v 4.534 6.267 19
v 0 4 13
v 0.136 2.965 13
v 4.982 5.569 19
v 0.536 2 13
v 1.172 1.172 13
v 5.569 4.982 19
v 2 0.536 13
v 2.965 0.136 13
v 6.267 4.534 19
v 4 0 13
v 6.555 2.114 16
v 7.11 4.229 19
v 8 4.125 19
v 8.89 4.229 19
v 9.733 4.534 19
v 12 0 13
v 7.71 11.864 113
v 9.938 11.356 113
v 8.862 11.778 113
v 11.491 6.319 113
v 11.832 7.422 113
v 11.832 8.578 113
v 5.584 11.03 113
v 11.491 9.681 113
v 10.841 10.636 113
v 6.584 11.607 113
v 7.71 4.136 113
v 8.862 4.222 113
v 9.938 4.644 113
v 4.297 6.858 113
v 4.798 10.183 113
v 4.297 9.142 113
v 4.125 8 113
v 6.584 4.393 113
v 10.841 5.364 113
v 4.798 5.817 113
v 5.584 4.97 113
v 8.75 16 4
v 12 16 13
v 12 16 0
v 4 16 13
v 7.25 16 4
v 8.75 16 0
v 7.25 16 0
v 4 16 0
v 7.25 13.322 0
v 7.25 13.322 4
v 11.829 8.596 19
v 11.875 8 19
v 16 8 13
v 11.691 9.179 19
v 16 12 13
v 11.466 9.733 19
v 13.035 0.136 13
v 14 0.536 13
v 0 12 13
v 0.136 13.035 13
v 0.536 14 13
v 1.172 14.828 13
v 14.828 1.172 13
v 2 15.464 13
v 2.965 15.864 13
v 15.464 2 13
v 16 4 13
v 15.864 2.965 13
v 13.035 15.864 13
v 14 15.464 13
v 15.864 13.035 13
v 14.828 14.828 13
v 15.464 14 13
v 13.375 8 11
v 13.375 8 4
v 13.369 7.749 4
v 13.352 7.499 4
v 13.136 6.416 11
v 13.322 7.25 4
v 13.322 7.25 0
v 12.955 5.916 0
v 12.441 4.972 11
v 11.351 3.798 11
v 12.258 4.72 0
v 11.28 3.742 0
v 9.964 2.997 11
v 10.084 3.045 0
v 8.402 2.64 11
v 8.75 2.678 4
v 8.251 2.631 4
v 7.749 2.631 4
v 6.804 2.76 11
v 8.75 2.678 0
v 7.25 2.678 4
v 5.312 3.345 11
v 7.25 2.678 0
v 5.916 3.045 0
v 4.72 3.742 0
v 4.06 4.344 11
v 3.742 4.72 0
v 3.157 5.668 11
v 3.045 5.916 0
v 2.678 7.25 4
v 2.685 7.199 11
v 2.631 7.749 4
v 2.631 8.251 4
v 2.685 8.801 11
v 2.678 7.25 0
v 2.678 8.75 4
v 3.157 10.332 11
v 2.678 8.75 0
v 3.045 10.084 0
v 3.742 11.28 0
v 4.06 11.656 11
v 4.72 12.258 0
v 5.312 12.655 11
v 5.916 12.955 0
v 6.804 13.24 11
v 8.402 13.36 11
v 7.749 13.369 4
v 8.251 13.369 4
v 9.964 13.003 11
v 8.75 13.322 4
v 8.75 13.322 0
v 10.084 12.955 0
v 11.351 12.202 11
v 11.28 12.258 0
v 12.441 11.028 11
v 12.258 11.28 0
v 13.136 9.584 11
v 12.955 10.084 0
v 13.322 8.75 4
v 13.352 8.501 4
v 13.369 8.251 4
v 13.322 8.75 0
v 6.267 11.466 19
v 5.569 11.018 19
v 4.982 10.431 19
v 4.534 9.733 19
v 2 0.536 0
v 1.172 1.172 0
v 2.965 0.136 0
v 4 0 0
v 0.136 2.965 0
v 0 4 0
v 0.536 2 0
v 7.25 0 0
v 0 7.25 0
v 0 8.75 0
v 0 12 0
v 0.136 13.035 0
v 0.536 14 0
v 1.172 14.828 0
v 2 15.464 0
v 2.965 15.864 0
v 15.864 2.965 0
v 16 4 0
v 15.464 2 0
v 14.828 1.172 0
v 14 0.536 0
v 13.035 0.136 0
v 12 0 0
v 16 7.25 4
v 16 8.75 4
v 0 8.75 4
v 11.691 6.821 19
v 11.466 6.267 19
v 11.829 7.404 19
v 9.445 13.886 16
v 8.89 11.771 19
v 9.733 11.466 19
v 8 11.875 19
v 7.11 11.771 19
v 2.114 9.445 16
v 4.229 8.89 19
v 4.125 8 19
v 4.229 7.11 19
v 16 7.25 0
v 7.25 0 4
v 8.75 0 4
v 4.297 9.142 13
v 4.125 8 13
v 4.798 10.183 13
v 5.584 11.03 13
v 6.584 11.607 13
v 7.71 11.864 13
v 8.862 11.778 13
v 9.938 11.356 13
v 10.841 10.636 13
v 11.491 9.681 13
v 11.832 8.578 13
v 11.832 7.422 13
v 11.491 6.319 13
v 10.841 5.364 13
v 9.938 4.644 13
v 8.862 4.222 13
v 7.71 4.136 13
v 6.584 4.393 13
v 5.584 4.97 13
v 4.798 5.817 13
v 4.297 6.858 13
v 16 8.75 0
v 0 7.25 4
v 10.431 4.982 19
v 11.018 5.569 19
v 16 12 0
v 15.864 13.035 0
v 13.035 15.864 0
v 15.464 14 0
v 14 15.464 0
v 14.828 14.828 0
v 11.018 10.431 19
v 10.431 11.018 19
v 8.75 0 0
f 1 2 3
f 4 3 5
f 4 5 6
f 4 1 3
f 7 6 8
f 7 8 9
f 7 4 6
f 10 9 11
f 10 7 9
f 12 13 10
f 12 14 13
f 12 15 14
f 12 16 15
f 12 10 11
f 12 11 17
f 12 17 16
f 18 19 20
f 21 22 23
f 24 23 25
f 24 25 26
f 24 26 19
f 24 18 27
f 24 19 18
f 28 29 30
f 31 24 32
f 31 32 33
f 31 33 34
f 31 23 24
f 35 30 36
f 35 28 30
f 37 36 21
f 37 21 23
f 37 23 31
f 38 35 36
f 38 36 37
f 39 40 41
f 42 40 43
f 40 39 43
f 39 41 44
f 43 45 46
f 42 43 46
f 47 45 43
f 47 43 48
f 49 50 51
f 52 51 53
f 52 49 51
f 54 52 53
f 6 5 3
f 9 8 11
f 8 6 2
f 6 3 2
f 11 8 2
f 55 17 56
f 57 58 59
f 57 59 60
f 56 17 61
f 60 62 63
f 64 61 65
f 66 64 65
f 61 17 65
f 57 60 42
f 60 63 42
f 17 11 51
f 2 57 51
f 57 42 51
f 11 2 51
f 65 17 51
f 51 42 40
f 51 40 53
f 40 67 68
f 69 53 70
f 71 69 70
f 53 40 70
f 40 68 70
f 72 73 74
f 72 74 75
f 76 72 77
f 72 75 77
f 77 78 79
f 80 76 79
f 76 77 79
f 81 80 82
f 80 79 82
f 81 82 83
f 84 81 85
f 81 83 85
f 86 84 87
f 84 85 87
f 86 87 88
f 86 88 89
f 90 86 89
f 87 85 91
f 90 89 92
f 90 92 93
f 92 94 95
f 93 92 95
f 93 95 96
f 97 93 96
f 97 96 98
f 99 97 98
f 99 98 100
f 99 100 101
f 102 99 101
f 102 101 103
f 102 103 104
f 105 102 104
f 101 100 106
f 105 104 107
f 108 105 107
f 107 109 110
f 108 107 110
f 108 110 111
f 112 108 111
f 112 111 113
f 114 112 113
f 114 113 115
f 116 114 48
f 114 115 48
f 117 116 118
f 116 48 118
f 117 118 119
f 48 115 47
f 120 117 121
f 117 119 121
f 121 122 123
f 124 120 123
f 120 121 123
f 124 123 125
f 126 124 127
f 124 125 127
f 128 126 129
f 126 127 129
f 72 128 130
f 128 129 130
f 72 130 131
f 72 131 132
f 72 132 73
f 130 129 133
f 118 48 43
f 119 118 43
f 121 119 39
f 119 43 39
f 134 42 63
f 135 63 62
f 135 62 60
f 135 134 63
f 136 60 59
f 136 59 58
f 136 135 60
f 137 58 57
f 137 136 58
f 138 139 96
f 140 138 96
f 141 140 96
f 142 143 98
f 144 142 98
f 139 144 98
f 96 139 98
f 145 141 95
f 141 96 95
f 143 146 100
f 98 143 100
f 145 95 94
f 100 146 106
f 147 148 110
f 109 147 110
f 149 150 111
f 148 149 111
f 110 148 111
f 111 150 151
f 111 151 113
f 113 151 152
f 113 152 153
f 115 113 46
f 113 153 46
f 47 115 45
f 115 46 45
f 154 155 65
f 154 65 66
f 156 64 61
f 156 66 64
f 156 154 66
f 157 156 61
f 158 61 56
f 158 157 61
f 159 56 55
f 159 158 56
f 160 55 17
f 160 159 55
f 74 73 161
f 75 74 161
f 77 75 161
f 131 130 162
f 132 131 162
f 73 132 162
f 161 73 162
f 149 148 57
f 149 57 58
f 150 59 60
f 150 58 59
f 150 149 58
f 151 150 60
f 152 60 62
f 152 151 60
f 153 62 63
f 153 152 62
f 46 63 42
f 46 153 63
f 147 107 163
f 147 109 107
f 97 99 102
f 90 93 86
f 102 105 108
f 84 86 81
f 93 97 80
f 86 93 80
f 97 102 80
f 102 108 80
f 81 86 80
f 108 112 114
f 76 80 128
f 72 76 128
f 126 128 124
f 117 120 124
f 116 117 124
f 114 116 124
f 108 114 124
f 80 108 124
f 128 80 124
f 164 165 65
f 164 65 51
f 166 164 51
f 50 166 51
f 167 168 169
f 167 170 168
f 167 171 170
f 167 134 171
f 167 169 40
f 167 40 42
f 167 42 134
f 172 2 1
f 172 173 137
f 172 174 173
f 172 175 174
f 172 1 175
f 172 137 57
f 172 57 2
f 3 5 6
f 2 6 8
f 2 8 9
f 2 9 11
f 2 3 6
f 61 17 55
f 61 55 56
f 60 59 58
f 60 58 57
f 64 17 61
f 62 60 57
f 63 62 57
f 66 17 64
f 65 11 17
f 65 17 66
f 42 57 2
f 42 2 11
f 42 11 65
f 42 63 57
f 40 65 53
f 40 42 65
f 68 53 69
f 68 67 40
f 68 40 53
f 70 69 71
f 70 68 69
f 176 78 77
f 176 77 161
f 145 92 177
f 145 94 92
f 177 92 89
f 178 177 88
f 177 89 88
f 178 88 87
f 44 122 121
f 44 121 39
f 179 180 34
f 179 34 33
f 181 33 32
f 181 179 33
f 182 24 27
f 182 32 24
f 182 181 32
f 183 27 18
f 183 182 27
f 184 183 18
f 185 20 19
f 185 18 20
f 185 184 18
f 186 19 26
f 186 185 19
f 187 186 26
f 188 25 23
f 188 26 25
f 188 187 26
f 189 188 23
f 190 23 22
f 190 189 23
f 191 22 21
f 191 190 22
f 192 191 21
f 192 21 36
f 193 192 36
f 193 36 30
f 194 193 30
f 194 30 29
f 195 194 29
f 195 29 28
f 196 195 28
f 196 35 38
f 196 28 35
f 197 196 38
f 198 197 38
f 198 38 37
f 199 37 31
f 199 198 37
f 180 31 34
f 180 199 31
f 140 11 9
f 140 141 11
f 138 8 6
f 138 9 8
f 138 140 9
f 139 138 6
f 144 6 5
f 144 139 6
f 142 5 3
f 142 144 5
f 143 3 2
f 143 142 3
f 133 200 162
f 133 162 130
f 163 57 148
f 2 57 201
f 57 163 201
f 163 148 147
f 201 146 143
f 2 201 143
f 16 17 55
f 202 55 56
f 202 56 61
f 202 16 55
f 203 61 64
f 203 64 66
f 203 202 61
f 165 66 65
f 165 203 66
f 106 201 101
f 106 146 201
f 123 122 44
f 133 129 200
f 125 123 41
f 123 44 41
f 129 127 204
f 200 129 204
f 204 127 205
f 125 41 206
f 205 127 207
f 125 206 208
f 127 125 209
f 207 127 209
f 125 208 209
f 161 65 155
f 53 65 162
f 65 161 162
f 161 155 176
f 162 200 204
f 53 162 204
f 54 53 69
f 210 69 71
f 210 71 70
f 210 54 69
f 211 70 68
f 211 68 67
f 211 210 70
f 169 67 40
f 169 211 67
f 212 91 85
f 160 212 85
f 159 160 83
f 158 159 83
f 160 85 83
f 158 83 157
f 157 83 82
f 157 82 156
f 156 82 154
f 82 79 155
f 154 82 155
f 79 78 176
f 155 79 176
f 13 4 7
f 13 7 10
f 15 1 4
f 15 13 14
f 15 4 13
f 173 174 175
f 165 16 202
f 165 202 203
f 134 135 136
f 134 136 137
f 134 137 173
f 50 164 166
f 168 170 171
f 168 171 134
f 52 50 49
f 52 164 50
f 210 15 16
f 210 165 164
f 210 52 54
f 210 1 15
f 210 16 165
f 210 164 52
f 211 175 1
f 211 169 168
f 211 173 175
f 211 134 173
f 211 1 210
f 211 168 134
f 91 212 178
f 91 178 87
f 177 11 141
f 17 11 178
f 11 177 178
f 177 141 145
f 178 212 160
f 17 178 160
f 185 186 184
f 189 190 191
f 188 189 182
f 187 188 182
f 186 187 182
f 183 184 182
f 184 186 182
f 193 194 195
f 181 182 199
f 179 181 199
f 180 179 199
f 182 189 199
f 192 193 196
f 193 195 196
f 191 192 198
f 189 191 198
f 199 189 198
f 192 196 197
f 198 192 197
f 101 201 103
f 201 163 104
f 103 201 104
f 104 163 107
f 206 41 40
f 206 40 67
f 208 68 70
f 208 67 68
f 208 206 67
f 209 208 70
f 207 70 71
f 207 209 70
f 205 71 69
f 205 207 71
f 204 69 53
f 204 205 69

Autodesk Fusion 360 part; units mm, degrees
sketch "Sketch1" plane through (0, 0, 0) normal (0, 0, 1) x (1, 0, 0) in component "Cube Connector"
  line L0 (4, 0) -> (12, 0)
  line L1 (16, 4) -> (16, 12)
  line L2 (12, 16) -> (4, 16)
  line L3 (0, 12) -> (0, 4)
  arc A0 (12, 0) -> (16, 4) centre (12, 4) ccw
  arc A1 (0, 4) -> (4, 0) centre (4, 4) ccw
  arc A2 (4, 16) -> (0, 12) centre (4, 12) ccw
  arc A3 (16, 12) -> (12, 16) centre (12, 12) ccw
  circle A4 centre (8, 8) radius 5.375
  point P0 (16, 0)
  point P1 (0, 16)
  dimension "d83" = 16
  dimension "d84" = 16
  dimension "d85" = 4
  dimension "d86" = 10.75
extrude "Extrude1" add sketch "Sketch1" along normal blind 13 contours L0 L1 L2 L3 A0 A1 A2 A3 | A4 makes body 1 in component "Cube Connector"
extrude "Extrude2" cut sketch "Sketch1" along normal blind 11 contours A4 bodies 1 in component "Cube Connector"
sketch "Sketch6" plane through (0, 0, 13) normal (0, 0, 1) x (-1, 0, 0) in component "Cube Connector"
  arc A0 (-16, -12) -> (-12, -16) centre (-12, -12) ccw
  line L0 (-12, -16) -> (-4, -16)
  arc A1 (-4, -16) -> (0, -12) centre (-4, -12) ccw
  line L1 (0, -12) -> (0, -4)
  arc A2 (0, -4) -> (-4, 0) centre (-4, -4) ccw
  line L2 (-4, 0) -> (-12, 0)
  arc A3 (-12, 0) -> (-16, -4) centre (-12, -4) ccw
  line L3 (-16, -4) -> (-16, -12)
  circle A4 centre (-8, -8) radius 3.875
  dimension "d98" = 7.75
extrude "Extrude5" add sketch "Sketch6" along normal blind 100 separate body contours A4 makes body 2 in component "Cube Connector"
ref_plane "WorkPlane2" through (8, 8, 19) normal (0, 0, 1) x (-1, 0, 0) in component "Cube Connector"
sketch "Sketch27" plane through (8, 8, 19) normal (0, 0, 1) x (1, 0, 0)
  circle A0 centre (0, 0) radius 3.875
  dimension "d115" = 7.75
sketch "Sketch14" plane through (8, 8, 19) normal (0, 0, 1) x (1, 0, 0) in component "Cube Connector"
  circle A0 centre (0, 0) radius 3.875
  dimension "d116" = 7.75
loft "Loft2" add profiles "Sketch6", "Sketch14" section 1 section 2 separate body makes body 3 in component "Cube Connector"
sketch "Sketch16" plane through (0, 0, 0) normal (0, 0, 1) x (1, 0, 0) in component "Cube Connector"
  line L0 (16, 8.75) -> (0, 8.75)
  arc A0 (0, 8.75) -> (0, 7.25) centre (0, 8) ccw
  line L1 (0, 7.25) -> (16, 7.25)
  arc A1 (16, 7.25) -> (16, 8.75) centre (16, 8) ccw
  line L2 (16, 8) -> (0, 8) construction
  line L3 (7.25, 16) -> (7.25, 0)
  arc A2 (7.25, 0) -> (8.75, 0) centre (8, 0) ccw
  line L4 (8.75, 0) -> (8.75, 16)
  arc A3 (8.75, 16) -> (7.25, 16) centre (8, 16) ccw
  line L5 (8, 16) -> (8, 0) construction
  dimension "d120" = 1.5
  dimension "d121" = 1.5
extrude "Extrude6" cut sketch "Sketch16" along normal blind 4 bodies 1 in component "Cube Connector"
sketch "Sketch14 (2)" plane through (0, 0, 0) normal (0, 0, 1) x (1, 0, 0)
  curve A0
  curve A1
  curve L0
  curve L1
  curve L2
  dimension "d53" = 6
revolve "Revolve3" [suppressed]
delete_face "DeleteFace3" [suppressed]
sketch "Sketch17" plane through (0, 0, 43) normal (0, 0, -1) x (1, 0, 0)
  circle A0 centre (7.75, -7.75) radius 7
  circle A1 centre (7.75, -7.75) radius 3.5
  curve A2
  curve L0
  line L1 (6.8215, -14.6882) -> (7.4028, -11.2327)
  curve L2
  curve L3
  point P0 (6.8215, -14.6882)
  point P1 (7.4028, -11.2327)
  dimension "d57" = 24.04
component "Cube Connector" placed x (1, 0, 0) y (0, 1, 0) z (0, 0, 1) at (0, 0, 0)
